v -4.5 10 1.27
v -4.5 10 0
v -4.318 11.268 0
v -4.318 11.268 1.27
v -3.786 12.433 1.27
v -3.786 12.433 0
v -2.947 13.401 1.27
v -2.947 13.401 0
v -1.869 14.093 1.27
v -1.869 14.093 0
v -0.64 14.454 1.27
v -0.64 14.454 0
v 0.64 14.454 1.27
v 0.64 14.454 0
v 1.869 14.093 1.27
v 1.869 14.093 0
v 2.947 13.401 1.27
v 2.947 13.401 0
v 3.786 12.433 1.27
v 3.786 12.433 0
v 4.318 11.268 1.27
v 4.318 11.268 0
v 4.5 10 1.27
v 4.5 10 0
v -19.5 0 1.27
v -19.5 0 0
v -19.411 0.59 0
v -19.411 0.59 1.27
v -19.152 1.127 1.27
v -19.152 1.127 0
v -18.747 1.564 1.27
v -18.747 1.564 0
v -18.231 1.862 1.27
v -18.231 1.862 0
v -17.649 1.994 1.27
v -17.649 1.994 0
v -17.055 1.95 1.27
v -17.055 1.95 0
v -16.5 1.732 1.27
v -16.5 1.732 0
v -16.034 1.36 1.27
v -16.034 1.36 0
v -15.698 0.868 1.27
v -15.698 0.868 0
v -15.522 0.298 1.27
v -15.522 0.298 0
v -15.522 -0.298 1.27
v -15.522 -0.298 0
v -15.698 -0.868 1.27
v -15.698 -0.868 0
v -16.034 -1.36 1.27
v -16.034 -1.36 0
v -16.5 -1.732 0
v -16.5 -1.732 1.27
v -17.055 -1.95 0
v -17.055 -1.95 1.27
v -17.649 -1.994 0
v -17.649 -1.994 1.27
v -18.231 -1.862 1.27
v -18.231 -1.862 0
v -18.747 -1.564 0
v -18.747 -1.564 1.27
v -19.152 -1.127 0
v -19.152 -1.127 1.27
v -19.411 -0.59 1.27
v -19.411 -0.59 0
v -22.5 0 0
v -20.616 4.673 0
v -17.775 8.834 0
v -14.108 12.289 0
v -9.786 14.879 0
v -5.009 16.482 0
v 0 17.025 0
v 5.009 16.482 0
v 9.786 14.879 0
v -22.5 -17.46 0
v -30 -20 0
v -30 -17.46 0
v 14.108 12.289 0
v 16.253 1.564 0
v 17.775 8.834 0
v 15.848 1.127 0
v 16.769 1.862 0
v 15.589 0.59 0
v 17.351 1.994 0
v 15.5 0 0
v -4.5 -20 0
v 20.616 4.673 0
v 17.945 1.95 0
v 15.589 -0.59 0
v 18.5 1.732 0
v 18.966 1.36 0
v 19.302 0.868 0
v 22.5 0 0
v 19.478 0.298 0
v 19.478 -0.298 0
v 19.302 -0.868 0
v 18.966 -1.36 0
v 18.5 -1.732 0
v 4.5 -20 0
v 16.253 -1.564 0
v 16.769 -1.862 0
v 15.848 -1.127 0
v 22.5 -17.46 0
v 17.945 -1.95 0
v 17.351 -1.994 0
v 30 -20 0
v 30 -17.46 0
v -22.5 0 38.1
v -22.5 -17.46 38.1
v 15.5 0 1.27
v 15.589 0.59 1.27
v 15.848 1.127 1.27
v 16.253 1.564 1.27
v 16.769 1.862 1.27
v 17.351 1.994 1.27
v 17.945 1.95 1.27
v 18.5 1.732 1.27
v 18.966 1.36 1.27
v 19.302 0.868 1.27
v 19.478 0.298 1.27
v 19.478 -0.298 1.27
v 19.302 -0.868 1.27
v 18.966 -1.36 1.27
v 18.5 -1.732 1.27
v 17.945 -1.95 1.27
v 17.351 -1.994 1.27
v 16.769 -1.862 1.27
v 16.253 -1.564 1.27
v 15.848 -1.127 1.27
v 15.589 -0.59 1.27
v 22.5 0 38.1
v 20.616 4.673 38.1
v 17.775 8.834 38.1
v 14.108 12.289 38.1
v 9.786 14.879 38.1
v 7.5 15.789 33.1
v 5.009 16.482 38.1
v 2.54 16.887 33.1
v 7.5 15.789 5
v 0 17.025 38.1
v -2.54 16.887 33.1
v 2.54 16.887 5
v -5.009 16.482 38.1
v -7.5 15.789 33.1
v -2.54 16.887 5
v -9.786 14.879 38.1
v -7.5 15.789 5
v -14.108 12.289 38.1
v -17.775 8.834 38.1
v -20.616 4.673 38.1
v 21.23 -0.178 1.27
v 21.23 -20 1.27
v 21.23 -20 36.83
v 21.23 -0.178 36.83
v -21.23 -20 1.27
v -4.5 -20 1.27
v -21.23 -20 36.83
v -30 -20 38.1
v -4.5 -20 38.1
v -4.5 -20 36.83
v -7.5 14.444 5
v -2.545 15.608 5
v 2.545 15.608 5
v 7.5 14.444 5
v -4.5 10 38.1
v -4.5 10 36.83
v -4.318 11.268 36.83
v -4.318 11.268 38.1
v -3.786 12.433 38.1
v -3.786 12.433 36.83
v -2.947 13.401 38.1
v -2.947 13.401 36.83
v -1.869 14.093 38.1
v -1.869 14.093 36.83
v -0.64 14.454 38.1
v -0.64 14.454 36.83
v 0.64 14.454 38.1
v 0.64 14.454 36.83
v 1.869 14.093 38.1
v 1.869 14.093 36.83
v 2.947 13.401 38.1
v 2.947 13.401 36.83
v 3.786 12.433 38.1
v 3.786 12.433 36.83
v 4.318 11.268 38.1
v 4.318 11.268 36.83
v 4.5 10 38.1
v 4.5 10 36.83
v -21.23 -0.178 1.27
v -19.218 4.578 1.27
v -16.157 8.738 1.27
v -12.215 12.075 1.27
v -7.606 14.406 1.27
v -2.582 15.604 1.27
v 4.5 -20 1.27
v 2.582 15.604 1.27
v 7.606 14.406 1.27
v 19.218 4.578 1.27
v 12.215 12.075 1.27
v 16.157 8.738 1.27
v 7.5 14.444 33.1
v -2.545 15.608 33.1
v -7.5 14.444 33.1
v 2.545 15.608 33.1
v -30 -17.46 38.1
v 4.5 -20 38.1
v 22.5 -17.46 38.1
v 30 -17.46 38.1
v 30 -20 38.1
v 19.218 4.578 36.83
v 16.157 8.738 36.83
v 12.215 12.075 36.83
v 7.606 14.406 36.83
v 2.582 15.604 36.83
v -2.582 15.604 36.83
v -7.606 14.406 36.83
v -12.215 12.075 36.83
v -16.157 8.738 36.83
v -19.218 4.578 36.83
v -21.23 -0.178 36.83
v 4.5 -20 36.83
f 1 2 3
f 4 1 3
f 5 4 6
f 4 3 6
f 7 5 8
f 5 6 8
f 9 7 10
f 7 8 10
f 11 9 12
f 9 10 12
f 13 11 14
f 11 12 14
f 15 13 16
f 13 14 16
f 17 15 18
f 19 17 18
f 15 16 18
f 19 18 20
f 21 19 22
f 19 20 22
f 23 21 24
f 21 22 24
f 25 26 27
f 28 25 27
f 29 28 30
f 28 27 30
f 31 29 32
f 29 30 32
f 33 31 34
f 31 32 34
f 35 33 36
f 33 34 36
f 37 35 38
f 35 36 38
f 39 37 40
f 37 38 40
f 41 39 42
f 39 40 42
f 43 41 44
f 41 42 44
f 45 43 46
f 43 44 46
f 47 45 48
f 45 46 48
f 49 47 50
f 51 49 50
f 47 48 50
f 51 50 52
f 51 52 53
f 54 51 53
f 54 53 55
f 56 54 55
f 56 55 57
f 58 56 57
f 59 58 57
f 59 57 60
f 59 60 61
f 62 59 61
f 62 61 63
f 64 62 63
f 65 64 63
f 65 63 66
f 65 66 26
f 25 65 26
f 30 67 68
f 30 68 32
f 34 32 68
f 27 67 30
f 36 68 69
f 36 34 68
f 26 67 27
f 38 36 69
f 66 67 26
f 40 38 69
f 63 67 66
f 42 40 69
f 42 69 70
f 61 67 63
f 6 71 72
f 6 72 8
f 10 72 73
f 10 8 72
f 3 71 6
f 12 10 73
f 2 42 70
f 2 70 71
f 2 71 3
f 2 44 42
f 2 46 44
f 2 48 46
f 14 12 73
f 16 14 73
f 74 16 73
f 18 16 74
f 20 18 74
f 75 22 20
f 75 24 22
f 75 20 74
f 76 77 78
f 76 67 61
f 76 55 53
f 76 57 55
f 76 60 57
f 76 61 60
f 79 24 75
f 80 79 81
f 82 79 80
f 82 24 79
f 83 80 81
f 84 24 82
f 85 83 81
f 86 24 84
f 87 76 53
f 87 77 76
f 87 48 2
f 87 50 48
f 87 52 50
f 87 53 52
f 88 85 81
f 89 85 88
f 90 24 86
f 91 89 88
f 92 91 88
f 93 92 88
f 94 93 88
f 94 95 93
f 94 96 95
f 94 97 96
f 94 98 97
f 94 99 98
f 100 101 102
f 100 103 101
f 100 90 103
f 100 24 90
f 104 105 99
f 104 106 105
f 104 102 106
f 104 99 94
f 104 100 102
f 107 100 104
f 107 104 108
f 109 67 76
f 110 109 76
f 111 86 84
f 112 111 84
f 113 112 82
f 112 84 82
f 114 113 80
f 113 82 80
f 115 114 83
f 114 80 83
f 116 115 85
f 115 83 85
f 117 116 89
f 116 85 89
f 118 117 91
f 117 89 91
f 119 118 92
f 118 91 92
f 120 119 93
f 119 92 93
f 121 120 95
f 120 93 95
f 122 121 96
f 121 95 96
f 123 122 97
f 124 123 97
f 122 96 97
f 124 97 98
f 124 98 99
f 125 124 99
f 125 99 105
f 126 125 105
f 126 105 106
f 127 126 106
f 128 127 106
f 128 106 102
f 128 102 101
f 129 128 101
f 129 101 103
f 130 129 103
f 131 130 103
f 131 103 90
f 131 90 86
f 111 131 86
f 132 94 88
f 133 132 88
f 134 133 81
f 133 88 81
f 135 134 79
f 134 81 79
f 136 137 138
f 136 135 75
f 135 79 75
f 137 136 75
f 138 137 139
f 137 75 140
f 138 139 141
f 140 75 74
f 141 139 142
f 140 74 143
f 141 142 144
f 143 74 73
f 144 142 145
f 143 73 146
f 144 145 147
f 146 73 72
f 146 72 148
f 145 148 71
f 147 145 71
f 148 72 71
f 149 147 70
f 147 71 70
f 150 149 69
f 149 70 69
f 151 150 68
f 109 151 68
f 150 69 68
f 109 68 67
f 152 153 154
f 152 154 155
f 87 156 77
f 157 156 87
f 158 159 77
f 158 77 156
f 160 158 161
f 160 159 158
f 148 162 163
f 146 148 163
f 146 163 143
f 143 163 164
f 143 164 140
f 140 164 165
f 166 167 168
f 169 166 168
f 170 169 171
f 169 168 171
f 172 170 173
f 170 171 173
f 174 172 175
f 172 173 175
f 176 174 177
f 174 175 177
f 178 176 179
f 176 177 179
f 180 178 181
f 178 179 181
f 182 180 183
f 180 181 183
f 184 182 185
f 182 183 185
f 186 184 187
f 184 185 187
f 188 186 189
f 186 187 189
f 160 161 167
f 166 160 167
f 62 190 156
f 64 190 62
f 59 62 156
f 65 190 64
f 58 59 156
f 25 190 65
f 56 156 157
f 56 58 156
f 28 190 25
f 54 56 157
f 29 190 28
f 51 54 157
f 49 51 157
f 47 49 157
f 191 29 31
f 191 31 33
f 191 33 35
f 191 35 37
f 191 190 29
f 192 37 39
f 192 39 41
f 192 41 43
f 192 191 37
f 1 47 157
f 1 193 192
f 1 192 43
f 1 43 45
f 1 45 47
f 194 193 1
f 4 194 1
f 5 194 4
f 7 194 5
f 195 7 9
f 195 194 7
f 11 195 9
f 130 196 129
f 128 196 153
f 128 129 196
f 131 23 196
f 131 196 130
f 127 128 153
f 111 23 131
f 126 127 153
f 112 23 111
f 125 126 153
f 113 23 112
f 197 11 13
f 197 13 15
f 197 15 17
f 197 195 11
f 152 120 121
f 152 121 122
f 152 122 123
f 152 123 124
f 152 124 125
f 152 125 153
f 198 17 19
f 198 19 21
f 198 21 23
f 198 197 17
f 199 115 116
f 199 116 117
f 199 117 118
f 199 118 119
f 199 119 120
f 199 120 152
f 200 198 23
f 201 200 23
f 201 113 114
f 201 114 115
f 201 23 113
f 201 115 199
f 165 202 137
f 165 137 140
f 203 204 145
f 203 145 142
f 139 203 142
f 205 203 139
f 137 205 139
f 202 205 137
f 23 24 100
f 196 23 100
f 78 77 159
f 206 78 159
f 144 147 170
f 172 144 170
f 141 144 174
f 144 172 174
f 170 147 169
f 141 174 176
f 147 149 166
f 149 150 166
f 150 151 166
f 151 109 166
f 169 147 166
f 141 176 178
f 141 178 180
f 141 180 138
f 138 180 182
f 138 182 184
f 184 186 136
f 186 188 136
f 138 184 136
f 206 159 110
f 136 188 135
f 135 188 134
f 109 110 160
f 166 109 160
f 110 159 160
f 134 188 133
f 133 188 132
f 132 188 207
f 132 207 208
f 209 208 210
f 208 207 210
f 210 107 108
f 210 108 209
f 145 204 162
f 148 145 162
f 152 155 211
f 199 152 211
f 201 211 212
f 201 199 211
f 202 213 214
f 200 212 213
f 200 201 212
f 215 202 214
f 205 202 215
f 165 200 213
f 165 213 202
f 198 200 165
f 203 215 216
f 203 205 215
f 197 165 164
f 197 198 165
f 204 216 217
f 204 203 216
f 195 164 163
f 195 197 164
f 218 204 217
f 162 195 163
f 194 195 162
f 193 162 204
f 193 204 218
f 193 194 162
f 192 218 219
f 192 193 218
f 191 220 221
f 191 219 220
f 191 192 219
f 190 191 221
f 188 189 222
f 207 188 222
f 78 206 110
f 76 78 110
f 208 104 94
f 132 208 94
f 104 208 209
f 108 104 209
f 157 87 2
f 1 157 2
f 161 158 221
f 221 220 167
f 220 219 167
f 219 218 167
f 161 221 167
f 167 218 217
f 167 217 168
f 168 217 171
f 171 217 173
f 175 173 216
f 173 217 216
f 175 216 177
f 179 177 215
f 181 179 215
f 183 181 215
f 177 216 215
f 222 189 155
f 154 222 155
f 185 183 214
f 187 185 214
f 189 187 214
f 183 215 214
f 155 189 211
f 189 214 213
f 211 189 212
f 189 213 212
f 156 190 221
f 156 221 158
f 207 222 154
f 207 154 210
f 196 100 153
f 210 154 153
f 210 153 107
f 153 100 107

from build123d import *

# Parameters (mm, degrees)
BOSS_EXTRUDE3_DEPTH     = 38.1
SHELL1_T                = -1.27
CUT_EXTRUDE1_DEPTH      = 39.1
SKETCH4_R               = 2
CUT_EXTRUDE2_DEPTH      = 2.54
SKETCH5_W               = 15
SKETCH5_H               = 28.1
CUT_EXTRUDE3_DEPTH      = 18.025
CUT_EXTRUDE3_DEPTH_BACK = 21
SKETCH6_W               = 7.5
SKETCH6_H               = 38.1
BOSS_EXTRUDE4_DEPTH     = 2.54


with BuildPart() as part:
    # Sketch1 → Boss-Extrude3 (new body)
    with BuildSketch(Plane.XY):
        with BuildLine():
            Line((-22.5, 0), (-22.5, -20))
            Line((-22.5, -20), (22.5, -20))
            Line((22.5, -20), (22.5, 0))
            ThreePointArc((22.5, 0), (0, 17.025), (-22.5, 0))
        make_face()
    extrude(amount=BOSS_EXTRUDE3_DEPTH)

    # Shell1
    shell1_openings = [part.faces().sort_by_distance(p)[0] for p in [
        (0, -20, 19.05),
    ]]
    offset(amount=SHELL1_T, openings=shell1_openings, kind=Kind.INTERSECTION)

    # Sketch3 → Cut-Extrude1 (cut, through all)
    with BuildSketch(Plane(origin=(0, 0, 0), x_dir=(-1, 0, 0), z_dir=(0, 0, -1))):
        with BuildLine():
            Line((-4.5, 10), (-4.5, -20))
            Line((-4.5, -20), (4.5, -20))
            Line((4.5, -20), (4.5, 10))
            ThreePointArc((4.5, 10), (0, 14.5), (-4.5, 10))
        make_face()
    extrude(amount=-CUT_EXTRUDE1_DEPTH, mode=Mode.SUBTRACT)

    # Sketch4 → Cut-Extrude2 (cut)
    with BuildSketch(Plane(origin=(0, 0, 0), x_dir=(-1, 0, 0), z_dir=(0, 0, -1))):
        with Locations((-17.5, 0)):
            Circle(SKETCH4_R)
        with Locations((17.5, 0)):
            Circle(SKETCH4_R)
    extrude(amount=-CUT_EXTRUDE2_DEPTH, mode=Mode.SUBTRACT)

    # Sketch5 → Cut-Extrude3 (cut, two sides)
    with BuildSketch(Plane(origin=(0, 0, 0), x_dir=(1, 0, 0), z_dir=(0, 1, 0))) as cut_extrude3_sk:
        with Locations((0, -19.05)):
            Rectangle(SKETCH5_W, SKETCH5_H)
    extrude(amount=CUT_EXTRUDE3_DEPTH, mode=Mode.SUBTRACT)
    extrude(cut_extrude3_sk.sketch, amount=-CUT_EXTRUDE3_DEPTH_BACK, mode=Mode.SUBTRACT)

    # Sketch6 → Boss-Extrude4 (add)
    with BuildSketch(Plane.XZ.offset(20)):
        with Locations((-26.25, 19.05)):
            Rectangle(SKETCH6_W, SKETCH6_H)
        with Locations((26.25, 19.05)):
            Rectangle(SKETCH6_W, SKETCH6_H)
    extrude(amount=-BOSS_EXTRUDE4_DEPTH)


solid = part.part
